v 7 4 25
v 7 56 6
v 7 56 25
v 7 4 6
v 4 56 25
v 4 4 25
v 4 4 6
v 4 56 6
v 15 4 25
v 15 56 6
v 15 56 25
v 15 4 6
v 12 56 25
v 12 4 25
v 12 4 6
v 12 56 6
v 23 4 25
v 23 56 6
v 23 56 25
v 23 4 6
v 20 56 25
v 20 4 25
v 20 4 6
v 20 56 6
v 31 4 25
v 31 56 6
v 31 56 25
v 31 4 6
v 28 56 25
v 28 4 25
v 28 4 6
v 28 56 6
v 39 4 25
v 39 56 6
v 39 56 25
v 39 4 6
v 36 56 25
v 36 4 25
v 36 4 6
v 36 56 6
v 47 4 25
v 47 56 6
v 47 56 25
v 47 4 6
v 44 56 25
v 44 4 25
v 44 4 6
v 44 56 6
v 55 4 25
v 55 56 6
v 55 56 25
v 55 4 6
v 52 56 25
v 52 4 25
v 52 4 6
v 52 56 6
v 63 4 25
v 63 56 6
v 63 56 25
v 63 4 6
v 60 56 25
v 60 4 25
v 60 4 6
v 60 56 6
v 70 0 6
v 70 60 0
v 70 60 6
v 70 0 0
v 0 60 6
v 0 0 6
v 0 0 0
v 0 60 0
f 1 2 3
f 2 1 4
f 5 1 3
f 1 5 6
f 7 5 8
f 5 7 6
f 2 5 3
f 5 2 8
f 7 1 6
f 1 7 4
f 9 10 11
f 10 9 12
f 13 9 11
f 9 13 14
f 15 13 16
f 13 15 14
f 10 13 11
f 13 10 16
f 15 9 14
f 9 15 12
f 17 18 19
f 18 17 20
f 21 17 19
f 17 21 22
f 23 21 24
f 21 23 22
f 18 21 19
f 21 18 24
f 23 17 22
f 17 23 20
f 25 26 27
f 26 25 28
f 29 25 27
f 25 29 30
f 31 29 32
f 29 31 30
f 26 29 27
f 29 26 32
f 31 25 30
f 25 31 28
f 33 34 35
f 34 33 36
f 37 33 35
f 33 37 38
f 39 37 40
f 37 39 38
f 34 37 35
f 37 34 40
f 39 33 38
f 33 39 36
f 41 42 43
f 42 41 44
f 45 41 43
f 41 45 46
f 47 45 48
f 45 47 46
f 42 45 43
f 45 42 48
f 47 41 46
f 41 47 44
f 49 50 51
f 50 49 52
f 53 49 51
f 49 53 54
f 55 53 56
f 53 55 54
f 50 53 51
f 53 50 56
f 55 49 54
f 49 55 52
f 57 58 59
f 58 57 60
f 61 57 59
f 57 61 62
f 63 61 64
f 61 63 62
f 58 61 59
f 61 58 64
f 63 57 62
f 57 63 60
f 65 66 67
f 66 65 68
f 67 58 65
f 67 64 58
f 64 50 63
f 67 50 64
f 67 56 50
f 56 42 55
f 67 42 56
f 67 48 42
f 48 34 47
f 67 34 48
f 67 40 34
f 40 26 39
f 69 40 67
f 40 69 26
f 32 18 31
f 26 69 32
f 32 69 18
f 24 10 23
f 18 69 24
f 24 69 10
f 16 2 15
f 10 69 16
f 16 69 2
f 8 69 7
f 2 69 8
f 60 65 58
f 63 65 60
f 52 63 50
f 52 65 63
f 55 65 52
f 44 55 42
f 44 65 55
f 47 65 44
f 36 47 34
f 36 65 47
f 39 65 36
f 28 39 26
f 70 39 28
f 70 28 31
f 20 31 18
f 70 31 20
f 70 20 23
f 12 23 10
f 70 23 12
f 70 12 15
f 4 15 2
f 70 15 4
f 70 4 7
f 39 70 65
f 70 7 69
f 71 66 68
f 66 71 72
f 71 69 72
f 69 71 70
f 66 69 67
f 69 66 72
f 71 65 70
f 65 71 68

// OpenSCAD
$fn = 32;

// ----------------------------------------------------------------------
// Heatsink: uniform fin block
// ----------------------------------------------------------------------

// --- parameters (mm) ---
base_l = 70;              // base length, X
base_w = 60;              // base width, Y
base_t = 6;               // base plate thickness
fin_h = 20;               // fin height above the base
fin_t = 3;                // fin thickness
edge = 4;                 // margin from the base ends
pitch = 8;                // fin pitch
fit_tol = 0.05;           // tolerance for press fits, mm
free_tol = 0.2;           // tolerance for clearance fits, mm

n_fins = floor((base_l - 2 * edge - fin_t) / pitch) + 1;  // fin count
total_h = base_t + fin_h - 1;  // overall height

union() {
  cube([base_l, base_w, base_t]);
  for (i = [0 : n_fins - 1])
    translate([edge + i * pitch, edge, base_t - 1])
      cube([fin_t, base_w - 2 * edge, fin_h]);
}
